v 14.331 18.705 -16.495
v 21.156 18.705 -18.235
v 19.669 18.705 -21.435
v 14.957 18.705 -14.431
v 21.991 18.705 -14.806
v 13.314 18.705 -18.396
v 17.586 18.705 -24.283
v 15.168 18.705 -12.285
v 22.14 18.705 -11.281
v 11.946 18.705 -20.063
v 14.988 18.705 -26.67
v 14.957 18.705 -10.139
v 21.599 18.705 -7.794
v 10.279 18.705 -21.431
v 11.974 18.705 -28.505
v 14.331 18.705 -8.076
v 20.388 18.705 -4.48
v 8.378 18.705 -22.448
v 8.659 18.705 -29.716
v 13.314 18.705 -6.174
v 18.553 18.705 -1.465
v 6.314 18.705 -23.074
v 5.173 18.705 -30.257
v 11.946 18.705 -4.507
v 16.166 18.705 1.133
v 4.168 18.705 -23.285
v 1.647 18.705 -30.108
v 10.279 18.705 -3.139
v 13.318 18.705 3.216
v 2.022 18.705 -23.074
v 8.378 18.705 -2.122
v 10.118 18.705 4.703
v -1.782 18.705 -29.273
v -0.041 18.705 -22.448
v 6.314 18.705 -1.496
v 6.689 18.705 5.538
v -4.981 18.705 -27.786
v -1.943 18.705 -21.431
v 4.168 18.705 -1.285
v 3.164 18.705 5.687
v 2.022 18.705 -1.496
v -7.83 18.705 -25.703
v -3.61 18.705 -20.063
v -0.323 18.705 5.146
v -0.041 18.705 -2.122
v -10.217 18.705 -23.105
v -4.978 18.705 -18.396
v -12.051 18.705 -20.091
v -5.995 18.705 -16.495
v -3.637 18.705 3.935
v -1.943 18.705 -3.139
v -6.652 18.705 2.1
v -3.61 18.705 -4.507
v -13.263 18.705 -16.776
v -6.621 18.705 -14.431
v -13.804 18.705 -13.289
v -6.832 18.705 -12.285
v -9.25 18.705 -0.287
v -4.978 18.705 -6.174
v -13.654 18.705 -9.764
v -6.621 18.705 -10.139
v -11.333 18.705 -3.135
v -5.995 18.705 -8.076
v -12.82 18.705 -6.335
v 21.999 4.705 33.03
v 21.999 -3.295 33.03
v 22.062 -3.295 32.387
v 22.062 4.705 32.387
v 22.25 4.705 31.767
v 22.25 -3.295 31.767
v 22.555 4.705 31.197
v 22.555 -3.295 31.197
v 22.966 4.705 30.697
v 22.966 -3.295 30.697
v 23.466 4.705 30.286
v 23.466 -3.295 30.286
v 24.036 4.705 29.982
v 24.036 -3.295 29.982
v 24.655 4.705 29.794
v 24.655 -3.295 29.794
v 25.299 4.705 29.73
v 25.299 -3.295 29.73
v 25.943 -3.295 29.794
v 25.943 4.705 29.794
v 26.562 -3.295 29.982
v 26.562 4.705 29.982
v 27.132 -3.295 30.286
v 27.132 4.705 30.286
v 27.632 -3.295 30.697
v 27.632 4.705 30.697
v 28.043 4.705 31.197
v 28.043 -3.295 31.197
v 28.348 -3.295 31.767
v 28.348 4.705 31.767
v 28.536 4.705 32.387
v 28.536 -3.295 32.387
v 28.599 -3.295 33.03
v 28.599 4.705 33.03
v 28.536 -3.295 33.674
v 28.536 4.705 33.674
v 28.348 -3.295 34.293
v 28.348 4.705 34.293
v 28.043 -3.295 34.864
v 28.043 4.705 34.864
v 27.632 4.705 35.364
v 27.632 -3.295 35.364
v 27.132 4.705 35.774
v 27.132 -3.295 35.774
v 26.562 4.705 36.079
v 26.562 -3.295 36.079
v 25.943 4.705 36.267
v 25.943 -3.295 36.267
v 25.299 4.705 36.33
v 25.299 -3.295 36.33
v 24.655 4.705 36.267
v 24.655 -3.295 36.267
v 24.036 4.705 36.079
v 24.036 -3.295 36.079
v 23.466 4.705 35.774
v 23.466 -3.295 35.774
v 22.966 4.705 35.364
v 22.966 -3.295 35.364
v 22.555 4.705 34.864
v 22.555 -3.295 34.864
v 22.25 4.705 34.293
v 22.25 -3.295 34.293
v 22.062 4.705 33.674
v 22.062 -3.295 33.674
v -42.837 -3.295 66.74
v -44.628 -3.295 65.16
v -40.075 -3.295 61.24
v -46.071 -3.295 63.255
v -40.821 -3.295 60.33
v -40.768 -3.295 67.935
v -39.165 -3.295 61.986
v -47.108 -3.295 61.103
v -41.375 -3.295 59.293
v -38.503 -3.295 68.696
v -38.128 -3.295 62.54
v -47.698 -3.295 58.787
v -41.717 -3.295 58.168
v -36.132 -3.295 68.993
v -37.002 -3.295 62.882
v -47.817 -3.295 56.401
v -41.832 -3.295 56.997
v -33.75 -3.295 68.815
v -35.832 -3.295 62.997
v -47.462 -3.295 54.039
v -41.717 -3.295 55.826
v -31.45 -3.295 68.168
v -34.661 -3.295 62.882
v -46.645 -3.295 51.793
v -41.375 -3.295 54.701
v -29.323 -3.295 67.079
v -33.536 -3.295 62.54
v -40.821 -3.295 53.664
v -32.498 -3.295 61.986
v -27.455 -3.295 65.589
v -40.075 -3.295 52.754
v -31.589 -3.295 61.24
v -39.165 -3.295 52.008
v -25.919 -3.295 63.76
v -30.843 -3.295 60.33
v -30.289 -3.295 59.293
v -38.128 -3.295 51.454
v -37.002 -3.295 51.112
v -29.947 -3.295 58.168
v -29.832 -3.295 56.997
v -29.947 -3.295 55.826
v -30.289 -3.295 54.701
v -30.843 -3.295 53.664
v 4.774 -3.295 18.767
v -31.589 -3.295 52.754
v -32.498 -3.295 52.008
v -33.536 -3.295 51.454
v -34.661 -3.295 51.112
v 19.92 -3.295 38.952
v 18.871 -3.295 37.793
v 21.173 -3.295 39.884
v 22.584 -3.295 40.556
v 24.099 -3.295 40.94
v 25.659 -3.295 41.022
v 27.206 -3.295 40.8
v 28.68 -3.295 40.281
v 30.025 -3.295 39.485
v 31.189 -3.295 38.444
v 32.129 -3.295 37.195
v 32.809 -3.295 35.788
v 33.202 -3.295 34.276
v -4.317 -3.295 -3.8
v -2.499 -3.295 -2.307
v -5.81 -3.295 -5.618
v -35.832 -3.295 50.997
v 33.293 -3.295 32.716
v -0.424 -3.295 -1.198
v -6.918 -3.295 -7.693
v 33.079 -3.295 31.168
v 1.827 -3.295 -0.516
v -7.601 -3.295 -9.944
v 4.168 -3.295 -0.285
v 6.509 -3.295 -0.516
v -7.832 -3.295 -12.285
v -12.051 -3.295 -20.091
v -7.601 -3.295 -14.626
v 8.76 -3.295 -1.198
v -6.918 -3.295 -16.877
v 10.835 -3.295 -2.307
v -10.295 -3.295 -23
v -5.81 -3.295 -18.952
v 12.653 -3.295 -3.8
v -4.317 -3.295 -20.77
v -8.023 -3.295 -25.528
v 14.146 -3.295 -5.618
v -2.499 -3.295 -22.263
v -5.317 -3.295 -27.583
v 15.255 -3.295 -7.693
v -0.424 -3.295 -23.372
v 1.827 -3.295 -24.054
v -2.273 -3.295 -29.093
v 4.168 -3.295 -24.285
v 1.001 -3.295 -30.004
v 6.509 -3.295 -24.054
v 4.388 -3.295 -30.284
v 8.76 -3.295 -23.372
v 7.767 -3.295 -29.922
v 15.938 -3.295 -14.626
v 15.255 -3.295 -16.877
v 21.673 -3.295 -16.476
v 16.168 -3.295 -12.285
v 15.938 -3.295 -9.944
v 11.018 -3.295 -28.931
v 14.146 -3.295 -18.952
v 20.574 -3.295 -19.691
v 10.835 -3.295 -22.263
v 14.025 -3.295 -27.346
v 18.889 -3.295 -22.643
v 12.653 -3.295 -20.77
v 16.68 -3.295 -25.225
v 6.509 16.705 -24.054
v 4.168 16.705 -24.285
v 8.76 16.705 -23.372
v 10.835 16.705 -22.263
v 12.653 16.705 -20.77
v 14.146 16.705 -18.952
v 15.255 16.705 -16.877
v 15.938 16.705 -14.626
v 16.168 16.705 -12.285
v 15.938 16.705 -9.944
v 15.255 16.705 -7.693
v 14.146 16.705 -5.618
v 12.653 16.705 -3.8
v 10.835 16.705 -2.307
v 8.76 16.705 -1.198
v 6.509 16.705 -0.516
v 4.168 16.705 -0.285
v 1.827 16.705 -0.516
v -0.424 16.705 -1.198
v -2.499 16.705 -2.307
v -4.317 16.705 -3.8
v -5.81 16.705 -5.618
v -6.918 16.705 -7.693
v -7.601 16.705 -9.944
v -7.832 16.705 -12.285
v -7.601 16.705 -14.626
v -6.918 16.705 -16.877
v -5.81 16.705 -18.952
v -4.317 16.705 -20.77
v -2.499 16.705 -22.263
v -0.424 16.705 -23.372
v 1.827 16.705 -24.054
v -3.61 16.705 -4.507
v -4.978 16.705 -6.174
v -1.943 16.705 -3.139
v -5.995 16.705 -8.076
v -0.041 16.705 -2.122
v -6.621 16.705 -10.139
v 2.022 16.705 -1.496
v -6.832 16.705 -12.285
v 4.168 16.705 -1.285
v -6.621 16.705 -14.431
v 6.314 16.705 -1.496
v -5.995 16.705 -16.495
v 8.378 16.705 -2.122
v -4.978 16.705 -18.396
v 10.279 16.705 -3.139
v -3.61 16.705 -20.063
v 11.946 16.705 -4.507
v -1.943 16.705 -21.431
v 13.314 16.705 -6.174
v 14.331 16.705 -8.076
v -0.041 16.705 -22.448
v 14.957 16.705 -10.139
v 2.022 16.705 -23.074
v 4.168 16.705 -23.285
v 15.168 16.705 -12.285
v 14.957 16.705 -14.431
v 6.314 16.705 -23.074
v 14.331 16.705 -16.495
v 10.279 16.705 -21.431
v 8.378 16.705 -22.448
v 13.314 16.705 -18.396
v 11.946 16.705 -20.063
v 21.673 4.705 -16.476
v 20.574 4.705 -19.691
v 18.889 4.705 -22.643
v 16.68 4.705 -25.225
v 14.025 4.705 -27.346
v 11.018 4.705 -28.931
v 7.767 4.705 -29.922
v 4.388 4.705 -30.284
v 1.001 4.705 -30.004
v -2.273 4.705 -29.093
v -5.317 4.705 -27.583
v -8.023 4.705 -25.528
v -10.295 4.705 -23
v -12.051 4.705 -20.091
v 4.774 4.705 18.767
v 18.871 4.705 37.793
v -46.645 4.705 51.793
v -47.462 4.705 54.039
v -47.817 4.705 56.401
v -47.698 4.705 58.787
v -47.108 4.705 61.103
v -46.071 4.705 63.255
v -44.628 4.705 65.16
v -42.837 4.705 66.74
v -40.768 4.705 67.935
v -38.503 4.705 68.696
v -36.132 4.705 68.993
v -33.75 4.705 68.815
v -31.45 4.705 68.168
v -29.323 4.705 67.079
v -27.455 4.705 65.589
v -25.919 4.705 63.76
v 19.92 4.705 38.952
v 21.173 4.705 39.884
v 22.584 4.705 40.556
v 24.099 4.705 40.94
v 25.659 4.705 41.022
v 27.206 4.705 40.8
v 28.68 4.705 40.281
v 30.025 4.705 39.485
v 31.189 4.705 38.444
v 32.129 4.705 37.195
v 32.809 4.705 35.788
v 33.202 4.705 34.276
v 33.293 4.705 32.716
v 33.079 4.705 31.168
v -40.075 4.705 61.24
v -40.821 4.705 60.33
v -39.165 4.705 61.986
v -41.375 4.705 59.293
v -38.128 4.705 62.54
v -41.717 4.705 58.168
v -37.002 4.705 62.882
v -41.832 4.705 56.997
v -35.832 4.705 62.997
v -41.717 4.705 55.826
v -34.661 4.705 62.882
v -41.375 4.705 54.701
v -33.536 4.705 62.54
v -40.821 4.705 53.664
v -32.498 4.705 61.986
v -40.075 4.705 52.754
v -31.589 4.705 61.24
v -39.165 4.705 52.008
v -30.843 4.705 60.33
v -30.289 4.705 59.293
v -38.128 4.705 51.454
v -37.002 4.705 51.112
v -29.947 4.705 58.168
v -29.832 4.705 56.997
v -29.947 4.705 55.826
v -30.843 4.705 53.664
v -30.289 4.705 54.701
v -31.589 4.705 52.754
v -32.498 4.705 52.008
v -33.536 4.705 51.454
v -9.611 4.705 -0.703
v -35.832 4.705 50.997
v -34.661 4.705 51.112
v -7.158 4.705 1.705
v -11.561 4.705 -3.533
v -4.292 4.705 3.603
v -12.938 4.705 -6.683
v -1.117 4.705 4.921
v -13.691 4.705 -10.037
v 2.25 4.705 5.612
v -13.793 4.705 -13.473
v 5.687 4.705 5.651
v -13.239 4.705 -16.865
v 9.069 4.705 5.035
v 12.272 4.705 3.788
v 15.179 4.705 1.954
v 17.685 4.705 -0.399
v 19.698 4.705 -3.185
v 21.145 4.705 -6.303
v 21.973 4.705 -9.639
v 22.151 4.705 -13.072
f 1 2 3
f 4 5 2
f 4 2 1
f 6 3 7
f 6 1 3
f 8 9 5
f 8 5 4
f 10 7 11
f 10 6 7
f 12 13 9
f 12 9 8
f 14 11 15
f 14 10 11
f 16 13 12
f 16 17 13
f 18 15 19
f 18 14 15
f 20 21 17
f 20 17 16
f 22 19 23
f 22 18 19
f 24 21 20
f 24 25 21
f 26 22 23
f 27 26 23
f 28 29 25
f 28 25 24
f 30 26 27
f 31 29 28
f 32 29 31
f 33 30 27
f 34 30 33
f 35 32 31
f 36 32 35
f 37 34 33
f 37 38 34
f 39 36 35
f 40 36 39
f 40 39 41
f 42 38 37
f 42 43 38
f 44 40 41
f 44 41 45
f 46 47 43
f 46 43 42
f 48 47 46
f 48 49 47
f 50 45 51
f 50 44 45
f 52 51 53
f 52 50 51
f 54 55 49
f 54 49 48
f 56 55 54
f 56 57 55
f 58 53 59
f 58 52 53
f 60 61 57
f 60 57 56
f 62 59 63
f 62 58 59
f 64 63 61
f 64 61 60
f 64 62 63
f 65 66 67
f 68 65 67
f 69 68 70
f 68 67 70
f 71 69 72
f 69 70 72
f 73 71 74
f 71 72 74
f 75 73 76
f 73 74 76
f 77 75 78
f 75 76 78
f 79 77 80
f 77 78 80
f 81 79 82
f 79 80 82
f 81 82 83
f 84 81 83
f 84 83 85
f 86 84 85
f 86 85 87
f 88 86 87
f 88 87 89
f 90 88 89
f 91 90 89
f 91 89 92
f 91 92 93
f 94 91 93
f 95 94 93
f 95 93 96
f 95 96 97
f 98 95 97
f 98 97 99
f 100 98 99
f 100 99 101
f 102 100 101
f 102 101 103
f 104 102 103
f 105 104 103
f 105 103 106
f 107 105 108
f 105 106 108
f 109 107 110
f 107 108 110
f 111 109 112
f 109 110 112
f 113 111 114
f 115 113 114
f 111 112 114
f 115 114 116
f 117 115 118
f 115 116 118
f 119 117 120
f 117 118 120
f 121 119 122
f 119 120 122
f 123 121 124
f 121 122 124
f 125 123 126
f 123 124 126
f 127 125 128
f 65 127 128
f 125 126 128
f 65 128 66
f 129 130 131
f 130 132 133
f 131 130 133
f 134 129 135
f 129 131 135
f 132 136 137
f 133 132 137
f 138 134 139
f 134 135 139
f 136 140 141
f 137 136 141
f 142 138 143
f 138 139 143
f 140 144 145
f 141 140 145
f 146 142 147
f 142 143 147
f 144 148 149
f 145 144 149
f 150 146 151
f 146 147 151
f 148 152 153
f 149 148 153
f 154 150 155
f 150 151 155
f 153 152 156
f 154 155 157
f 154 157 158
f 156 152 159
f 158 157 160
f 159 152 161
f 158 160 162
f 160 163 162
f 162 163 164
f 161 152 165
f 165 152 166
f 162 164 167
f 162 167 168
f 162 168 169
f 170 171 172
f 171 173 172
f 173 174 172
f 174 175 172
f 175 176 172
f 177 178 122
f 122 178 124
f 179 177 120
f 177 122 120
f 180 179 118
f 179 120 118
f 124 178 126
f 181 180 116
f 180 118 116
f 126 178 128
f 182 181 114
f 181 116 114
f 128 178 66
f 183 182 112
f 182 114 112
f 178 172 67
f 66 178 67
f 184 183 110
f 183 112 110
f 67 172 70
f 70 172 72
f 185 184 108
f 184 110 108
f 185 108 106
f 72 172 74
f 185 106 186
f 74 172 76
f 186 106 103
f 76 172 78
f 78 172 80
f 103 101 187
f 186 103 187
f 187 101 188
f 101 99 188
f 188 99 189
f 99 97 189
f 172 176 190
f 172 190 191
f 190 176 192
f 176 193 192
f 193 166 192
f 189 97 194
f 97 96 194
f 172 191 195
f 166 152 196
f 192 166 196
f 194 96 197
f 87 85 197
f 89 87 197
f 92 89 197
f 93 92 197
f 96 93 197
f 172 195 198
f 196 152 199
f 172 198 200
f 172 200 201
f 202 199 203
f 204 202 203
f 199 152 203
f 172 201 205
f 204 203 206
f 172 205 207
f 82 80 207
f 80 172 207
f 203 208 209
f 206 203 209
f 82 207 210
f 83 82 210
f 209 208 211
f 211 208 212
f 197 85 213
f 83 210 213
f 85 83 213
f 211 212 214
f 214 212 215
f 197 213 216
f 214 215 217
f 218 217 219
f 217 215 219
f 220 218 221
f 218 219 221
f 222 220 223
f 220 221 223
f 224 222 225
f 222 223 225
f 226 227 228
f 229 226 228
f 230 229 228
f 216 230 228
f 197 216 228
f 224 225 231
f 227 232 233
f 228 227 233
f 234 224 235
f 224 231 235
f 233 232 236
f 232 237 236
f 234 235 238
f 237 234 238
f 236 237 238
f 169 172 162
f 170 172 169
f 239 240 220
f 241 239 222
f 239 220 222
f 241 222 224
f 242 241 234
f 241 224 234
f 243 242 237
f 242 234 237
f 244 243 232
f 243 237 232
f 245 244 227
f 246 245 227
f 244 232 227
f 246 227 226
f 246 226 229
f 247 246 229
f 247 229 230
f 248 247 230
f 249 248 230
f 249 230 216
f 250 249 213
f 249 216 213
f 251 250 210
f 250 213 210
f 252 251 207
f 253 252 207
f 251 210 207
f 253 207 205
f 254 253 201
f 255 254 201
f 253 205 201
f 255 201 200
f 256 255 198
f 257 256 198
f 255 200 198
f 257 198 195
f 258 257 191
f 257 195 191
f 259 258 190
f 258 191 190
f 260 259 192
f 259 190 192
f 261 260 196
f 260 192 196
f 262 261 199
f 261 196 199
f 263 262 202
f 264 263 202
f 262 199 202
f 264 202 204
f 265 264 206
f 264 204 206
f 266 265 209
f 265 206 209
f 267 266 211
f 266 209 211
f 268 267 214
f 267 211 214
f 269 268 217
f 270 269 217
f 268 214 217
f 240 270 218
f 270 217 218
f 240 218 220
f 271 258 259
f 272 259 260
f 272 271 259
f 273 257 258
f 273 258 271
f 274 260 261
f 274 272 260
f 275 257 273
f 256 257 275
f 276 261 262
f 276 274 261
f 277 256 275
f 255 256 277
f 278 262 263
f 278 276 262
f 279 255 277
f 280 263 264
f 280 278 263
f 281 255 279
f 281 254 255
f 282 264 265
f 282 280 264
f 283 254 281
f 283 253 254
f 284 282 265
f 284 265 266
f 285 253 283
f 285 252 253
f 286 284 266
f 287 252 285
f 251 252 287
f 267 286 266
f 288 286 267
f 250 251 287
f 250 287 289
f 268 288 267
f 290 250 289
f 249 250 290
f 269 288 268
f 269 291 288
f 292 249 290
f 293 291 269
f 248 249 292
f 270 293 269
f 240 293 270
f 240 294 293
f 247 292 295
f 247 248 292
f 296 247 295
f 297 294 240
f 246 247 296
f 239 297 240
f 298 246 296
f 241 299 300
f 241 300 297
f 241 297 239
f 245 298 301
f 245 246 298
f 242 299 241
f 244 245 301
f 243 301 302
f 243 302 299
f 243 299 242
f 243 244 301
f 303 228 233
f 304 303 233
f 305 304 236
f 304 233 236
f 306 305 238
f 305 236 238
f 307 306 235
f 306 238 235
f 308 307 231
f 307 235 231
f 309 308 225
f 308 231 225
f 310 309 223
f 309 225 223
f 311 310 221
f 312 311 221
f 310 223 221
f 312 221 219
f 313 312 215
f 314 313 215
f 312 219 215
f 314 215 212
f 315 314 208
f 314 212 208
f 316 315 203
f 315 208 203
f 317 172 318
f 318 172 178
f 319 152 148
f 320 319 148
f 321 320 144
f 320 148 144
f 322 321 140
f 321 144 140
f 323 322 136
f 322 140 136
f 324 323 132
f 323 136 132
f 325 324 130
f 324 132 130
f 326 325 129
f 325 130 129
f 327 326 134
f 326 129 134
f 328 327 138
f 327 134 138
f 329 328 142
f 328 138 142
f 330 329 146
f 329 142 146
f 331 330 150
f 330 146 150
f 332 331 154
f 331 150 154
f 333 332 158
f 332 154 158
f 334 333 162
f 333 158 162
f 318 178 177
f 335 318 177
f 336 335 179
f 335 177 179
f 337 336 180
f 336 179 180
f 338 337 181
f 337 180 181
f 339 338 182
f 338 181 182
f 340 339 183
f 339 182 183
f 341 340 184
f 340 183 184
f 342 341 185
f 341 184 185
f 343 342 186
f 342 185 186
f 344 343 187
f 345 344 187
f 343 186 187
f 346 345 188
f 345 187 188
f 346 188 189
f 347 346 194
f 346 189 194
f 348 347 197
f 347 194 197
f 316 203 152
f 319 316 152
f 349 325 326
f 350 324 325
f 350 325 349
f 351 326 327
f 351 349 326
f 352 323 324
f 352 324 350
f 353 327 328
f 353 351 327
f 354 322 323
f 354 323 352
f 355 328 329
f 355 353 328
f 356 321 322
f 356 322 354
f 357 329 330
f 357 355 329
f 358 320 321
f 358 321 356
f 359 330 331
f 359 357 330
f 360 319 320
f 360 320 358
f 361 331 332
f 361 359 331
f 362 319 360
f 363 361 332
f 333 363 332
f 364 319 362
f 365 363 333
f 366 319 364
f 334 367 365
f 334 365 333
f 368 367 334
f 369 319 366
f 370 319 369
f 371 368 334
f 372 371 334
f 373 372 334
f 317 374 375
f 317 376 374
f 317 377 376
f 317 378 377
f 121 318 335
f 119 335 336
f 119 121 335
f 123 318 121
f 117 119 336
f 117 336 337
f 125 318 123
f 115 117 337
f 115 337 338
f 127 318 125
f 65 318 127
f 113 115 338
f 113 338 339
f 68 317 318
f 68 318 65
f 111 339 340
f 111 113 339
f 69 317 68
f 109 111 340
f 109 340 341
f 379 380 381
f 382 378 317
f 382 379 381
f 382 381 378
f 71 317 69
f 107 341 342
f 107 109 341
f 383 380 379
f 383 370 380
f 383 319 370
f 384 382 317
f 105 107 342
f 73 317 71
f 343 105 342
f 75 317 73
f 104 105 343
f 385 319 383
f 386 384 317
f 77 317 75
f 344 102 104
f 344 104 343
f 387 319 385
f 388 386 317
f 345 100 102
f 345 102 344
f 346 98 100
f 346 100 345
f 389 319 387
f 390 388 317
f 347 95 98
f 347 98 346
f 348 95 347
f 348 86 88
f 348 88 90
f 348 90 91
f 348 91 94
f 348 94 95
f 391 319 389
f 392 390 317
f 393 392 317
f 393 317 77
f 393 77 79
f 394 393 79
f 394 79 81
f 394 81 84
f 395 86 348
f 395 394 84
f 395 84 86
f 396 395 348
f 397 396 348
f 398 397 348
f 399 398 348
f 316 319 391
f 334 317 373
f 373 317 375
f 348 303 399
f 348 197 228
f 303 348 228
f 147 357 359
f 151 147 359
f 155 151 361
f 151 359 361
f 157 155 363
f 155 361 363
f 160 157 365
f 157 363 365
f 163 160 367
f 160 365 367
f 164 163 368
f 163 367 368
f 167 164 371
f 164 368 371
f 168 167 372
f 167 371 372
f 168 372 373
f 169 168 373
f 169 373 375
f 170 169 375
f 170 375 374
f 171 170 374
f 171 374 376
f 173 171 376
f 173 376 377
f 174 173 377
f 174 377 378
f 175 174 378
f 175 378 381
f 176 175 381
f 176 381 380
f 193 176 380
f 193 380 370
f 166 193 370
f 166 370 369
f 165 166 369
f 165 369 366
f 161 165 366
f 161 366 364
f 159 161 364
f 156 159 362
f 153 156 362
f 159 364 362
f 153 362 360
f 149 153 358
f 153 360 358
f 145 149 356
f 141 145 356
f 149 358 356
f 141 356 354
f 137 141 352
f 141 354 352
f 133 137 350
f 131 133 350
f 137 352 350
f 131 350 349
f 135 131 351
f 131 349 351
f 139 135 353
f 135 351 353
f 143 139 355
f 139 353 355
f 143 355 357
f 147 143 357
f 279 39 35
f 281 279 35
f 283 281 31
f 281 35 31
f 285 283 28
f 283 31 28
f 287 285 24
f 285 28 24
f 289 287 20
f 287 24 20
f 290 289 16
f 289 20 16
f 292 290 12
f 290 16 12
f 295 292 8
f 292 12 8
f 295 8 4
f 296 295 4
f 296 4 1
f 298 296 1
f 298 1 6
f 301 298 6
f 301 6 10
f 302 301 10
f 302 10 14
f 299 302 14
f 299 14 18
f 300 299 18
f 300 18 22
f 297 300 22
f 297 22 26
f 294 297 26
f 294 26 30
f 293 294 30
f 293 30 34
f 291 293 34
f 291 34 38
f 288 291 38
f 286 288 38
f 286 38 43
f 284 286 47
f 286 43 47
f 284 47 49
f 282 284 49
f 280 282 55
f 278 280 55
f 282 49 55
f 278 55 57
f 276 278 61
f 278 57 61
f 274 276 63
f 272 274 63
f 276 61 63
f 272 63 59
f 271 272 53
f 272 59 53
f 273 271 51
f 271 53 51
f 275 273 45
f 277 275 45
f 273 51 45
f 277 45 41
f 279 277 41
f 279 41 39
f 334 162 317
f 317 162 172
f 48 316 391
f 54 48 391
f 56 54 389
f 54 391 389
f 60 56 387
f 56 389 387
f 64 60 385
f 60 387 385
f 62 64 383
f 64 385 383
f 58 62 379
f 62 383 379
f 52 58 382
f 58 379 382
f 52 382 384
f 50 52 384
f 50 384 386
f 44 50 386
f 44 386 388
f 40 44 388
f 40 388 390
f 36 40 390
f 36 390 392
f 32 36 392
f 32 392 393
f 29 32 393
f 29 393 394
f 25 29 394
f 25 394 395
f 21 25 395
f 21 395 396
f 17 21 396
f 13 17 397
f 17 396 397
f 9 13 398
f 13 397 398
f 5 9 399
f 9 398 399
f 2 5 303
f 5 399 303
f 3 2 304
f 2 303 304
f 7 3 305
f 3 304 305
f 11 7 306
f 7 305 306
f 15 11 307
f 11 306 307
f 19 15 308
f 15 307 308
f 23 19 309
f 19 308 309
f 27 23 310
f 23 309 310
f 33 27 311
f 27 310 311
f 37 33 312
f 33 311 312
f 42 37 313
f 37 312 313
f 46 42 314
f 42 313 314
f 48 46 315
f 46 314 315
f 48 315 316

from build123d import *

# Parameters (mm, degrees)
EXTRUDE_1_DEPTH     = 4
SKETCH_3_R          = 9
EXTRUDE_2_DEPTH     = 7
SKETCH_4_R          = 3
CUT_EXTRUDE_1_DEPTH = 49.751330175
SKETCH_5_R          = 6
CUT_EXTRUDE_2_DEPTH = 10
SKETCH_7_R          = 5.5
CUT_EXTRUDE_3_DEPTH = 50.484262082
HOLE_WIZARD_M4_1_D  = 3.3
SCALE1_SCALE        = 2


with BuildPart() as part:
    # 草图1 → 凸台-拉伸1 (new body)
    with BuildSketch(Plane(origin=(0, 0, 0), x_dir=(1, 0, 0), z_dir=(0, 1, 0))):
        with BuildLine():
            Line((-8.109776452, 3.902758754), (-25.406517635, -32.039176982))
            ThreePointArc((-25.406517635, -32.039176982), (-23, -39.837168574), (-15.043482365, -38.022278184))
            Line((-15.043482365, -38.022278184), (0.302963304, -15.526261061))
            Line((0.302963304, -15.526261061), (7.351564548, -25.039059461))
            ThreePointArc((7.351564548, -25.039059461), (12.25592959, -26.282925824), (14.455537758, -21.72642235))
            Line((14.455537758, -21.72642235), (8.752682732, 2.095362733))
            ThreePointArc((8.752682732, 2.095362733), (0.95916746, 8.948742805), (-8.109776452, 3.902758754))
        make_face()
    extrude(amount=EXTRUDE_1_DEPTH)

    # 草图3 → 凸台-拉伸2 (add)
    with BuildSketch(Plane(origin=(0, 4, 0), x_dir=(1, 0, 0), z_dir=(0, 1, 0))):
        with Locations(Location((0, 0, 0), (0, 0, 154.301222305))):
            Circle(SKETCH_3_R)
    extrude(amount=EXTRUDE_2_DEPTH)

    # 草图4 → 切除-拉伸1 (cut, through all)
    with BuildSketch(Plane(origin=(0, 4, 0), x_dir=(1, 0, 0), z_dir=(0, 1, 0))):
        with Locations(Location((-20, -34.641016151, 0), (0, 0, 270))):
            Circle(SKETCH_4_R)
    extrude(amount=-CUT_EXTRUDE_1_DEPTH, mode=Mode.SUBTRACT)

    # 草图5 → 切除-拉伸2 (cut)
    with BuildSketch(Plane.XZ):
        with Locations(Location((0, 0, 0), (0, 0, 270))):
            Circle(SKETCH_5_R)
    extrude(amount=-CUT_EXTRUDE_2_DEPTH, mode=Mode.SUBTRACT)

    # 草图7 → 切除-拉伸3 (cut, through all)
    with BuildSketch(Plane(origin=(0, 11, 0), x_dir=(1, 0, 0), z_dir=(0, 1, 0))):
        with Locations(Location((0, 0, 0), (0, 0, 270))):
            Circle(SKETCH_7_R)
    extrude(amount=-CUT_EXTRUDE_3_DEPTH, mode=Mode.SUBTRACT)

    # M4 螺纹孔1 (through all)
    with Locations(Plane(origin=(0, 4, 0), x_dir=(1, 0, 0), z_dir=(0, 1, 0))):
        with Locations((10.565456544, -22.657694676)):
            Hole(HOLE_WIZARD_M4_1_D / 2)


with BuildPart() as part_1:
    # Scale1: scaled about (-4.168101576, 3.295275318, 12.285042226)
    add(part.part.scale(SCALE1_SCALE).moved(Location((4.168101576, -3.295275318, -12.285042226))))


solid = part_1.part
